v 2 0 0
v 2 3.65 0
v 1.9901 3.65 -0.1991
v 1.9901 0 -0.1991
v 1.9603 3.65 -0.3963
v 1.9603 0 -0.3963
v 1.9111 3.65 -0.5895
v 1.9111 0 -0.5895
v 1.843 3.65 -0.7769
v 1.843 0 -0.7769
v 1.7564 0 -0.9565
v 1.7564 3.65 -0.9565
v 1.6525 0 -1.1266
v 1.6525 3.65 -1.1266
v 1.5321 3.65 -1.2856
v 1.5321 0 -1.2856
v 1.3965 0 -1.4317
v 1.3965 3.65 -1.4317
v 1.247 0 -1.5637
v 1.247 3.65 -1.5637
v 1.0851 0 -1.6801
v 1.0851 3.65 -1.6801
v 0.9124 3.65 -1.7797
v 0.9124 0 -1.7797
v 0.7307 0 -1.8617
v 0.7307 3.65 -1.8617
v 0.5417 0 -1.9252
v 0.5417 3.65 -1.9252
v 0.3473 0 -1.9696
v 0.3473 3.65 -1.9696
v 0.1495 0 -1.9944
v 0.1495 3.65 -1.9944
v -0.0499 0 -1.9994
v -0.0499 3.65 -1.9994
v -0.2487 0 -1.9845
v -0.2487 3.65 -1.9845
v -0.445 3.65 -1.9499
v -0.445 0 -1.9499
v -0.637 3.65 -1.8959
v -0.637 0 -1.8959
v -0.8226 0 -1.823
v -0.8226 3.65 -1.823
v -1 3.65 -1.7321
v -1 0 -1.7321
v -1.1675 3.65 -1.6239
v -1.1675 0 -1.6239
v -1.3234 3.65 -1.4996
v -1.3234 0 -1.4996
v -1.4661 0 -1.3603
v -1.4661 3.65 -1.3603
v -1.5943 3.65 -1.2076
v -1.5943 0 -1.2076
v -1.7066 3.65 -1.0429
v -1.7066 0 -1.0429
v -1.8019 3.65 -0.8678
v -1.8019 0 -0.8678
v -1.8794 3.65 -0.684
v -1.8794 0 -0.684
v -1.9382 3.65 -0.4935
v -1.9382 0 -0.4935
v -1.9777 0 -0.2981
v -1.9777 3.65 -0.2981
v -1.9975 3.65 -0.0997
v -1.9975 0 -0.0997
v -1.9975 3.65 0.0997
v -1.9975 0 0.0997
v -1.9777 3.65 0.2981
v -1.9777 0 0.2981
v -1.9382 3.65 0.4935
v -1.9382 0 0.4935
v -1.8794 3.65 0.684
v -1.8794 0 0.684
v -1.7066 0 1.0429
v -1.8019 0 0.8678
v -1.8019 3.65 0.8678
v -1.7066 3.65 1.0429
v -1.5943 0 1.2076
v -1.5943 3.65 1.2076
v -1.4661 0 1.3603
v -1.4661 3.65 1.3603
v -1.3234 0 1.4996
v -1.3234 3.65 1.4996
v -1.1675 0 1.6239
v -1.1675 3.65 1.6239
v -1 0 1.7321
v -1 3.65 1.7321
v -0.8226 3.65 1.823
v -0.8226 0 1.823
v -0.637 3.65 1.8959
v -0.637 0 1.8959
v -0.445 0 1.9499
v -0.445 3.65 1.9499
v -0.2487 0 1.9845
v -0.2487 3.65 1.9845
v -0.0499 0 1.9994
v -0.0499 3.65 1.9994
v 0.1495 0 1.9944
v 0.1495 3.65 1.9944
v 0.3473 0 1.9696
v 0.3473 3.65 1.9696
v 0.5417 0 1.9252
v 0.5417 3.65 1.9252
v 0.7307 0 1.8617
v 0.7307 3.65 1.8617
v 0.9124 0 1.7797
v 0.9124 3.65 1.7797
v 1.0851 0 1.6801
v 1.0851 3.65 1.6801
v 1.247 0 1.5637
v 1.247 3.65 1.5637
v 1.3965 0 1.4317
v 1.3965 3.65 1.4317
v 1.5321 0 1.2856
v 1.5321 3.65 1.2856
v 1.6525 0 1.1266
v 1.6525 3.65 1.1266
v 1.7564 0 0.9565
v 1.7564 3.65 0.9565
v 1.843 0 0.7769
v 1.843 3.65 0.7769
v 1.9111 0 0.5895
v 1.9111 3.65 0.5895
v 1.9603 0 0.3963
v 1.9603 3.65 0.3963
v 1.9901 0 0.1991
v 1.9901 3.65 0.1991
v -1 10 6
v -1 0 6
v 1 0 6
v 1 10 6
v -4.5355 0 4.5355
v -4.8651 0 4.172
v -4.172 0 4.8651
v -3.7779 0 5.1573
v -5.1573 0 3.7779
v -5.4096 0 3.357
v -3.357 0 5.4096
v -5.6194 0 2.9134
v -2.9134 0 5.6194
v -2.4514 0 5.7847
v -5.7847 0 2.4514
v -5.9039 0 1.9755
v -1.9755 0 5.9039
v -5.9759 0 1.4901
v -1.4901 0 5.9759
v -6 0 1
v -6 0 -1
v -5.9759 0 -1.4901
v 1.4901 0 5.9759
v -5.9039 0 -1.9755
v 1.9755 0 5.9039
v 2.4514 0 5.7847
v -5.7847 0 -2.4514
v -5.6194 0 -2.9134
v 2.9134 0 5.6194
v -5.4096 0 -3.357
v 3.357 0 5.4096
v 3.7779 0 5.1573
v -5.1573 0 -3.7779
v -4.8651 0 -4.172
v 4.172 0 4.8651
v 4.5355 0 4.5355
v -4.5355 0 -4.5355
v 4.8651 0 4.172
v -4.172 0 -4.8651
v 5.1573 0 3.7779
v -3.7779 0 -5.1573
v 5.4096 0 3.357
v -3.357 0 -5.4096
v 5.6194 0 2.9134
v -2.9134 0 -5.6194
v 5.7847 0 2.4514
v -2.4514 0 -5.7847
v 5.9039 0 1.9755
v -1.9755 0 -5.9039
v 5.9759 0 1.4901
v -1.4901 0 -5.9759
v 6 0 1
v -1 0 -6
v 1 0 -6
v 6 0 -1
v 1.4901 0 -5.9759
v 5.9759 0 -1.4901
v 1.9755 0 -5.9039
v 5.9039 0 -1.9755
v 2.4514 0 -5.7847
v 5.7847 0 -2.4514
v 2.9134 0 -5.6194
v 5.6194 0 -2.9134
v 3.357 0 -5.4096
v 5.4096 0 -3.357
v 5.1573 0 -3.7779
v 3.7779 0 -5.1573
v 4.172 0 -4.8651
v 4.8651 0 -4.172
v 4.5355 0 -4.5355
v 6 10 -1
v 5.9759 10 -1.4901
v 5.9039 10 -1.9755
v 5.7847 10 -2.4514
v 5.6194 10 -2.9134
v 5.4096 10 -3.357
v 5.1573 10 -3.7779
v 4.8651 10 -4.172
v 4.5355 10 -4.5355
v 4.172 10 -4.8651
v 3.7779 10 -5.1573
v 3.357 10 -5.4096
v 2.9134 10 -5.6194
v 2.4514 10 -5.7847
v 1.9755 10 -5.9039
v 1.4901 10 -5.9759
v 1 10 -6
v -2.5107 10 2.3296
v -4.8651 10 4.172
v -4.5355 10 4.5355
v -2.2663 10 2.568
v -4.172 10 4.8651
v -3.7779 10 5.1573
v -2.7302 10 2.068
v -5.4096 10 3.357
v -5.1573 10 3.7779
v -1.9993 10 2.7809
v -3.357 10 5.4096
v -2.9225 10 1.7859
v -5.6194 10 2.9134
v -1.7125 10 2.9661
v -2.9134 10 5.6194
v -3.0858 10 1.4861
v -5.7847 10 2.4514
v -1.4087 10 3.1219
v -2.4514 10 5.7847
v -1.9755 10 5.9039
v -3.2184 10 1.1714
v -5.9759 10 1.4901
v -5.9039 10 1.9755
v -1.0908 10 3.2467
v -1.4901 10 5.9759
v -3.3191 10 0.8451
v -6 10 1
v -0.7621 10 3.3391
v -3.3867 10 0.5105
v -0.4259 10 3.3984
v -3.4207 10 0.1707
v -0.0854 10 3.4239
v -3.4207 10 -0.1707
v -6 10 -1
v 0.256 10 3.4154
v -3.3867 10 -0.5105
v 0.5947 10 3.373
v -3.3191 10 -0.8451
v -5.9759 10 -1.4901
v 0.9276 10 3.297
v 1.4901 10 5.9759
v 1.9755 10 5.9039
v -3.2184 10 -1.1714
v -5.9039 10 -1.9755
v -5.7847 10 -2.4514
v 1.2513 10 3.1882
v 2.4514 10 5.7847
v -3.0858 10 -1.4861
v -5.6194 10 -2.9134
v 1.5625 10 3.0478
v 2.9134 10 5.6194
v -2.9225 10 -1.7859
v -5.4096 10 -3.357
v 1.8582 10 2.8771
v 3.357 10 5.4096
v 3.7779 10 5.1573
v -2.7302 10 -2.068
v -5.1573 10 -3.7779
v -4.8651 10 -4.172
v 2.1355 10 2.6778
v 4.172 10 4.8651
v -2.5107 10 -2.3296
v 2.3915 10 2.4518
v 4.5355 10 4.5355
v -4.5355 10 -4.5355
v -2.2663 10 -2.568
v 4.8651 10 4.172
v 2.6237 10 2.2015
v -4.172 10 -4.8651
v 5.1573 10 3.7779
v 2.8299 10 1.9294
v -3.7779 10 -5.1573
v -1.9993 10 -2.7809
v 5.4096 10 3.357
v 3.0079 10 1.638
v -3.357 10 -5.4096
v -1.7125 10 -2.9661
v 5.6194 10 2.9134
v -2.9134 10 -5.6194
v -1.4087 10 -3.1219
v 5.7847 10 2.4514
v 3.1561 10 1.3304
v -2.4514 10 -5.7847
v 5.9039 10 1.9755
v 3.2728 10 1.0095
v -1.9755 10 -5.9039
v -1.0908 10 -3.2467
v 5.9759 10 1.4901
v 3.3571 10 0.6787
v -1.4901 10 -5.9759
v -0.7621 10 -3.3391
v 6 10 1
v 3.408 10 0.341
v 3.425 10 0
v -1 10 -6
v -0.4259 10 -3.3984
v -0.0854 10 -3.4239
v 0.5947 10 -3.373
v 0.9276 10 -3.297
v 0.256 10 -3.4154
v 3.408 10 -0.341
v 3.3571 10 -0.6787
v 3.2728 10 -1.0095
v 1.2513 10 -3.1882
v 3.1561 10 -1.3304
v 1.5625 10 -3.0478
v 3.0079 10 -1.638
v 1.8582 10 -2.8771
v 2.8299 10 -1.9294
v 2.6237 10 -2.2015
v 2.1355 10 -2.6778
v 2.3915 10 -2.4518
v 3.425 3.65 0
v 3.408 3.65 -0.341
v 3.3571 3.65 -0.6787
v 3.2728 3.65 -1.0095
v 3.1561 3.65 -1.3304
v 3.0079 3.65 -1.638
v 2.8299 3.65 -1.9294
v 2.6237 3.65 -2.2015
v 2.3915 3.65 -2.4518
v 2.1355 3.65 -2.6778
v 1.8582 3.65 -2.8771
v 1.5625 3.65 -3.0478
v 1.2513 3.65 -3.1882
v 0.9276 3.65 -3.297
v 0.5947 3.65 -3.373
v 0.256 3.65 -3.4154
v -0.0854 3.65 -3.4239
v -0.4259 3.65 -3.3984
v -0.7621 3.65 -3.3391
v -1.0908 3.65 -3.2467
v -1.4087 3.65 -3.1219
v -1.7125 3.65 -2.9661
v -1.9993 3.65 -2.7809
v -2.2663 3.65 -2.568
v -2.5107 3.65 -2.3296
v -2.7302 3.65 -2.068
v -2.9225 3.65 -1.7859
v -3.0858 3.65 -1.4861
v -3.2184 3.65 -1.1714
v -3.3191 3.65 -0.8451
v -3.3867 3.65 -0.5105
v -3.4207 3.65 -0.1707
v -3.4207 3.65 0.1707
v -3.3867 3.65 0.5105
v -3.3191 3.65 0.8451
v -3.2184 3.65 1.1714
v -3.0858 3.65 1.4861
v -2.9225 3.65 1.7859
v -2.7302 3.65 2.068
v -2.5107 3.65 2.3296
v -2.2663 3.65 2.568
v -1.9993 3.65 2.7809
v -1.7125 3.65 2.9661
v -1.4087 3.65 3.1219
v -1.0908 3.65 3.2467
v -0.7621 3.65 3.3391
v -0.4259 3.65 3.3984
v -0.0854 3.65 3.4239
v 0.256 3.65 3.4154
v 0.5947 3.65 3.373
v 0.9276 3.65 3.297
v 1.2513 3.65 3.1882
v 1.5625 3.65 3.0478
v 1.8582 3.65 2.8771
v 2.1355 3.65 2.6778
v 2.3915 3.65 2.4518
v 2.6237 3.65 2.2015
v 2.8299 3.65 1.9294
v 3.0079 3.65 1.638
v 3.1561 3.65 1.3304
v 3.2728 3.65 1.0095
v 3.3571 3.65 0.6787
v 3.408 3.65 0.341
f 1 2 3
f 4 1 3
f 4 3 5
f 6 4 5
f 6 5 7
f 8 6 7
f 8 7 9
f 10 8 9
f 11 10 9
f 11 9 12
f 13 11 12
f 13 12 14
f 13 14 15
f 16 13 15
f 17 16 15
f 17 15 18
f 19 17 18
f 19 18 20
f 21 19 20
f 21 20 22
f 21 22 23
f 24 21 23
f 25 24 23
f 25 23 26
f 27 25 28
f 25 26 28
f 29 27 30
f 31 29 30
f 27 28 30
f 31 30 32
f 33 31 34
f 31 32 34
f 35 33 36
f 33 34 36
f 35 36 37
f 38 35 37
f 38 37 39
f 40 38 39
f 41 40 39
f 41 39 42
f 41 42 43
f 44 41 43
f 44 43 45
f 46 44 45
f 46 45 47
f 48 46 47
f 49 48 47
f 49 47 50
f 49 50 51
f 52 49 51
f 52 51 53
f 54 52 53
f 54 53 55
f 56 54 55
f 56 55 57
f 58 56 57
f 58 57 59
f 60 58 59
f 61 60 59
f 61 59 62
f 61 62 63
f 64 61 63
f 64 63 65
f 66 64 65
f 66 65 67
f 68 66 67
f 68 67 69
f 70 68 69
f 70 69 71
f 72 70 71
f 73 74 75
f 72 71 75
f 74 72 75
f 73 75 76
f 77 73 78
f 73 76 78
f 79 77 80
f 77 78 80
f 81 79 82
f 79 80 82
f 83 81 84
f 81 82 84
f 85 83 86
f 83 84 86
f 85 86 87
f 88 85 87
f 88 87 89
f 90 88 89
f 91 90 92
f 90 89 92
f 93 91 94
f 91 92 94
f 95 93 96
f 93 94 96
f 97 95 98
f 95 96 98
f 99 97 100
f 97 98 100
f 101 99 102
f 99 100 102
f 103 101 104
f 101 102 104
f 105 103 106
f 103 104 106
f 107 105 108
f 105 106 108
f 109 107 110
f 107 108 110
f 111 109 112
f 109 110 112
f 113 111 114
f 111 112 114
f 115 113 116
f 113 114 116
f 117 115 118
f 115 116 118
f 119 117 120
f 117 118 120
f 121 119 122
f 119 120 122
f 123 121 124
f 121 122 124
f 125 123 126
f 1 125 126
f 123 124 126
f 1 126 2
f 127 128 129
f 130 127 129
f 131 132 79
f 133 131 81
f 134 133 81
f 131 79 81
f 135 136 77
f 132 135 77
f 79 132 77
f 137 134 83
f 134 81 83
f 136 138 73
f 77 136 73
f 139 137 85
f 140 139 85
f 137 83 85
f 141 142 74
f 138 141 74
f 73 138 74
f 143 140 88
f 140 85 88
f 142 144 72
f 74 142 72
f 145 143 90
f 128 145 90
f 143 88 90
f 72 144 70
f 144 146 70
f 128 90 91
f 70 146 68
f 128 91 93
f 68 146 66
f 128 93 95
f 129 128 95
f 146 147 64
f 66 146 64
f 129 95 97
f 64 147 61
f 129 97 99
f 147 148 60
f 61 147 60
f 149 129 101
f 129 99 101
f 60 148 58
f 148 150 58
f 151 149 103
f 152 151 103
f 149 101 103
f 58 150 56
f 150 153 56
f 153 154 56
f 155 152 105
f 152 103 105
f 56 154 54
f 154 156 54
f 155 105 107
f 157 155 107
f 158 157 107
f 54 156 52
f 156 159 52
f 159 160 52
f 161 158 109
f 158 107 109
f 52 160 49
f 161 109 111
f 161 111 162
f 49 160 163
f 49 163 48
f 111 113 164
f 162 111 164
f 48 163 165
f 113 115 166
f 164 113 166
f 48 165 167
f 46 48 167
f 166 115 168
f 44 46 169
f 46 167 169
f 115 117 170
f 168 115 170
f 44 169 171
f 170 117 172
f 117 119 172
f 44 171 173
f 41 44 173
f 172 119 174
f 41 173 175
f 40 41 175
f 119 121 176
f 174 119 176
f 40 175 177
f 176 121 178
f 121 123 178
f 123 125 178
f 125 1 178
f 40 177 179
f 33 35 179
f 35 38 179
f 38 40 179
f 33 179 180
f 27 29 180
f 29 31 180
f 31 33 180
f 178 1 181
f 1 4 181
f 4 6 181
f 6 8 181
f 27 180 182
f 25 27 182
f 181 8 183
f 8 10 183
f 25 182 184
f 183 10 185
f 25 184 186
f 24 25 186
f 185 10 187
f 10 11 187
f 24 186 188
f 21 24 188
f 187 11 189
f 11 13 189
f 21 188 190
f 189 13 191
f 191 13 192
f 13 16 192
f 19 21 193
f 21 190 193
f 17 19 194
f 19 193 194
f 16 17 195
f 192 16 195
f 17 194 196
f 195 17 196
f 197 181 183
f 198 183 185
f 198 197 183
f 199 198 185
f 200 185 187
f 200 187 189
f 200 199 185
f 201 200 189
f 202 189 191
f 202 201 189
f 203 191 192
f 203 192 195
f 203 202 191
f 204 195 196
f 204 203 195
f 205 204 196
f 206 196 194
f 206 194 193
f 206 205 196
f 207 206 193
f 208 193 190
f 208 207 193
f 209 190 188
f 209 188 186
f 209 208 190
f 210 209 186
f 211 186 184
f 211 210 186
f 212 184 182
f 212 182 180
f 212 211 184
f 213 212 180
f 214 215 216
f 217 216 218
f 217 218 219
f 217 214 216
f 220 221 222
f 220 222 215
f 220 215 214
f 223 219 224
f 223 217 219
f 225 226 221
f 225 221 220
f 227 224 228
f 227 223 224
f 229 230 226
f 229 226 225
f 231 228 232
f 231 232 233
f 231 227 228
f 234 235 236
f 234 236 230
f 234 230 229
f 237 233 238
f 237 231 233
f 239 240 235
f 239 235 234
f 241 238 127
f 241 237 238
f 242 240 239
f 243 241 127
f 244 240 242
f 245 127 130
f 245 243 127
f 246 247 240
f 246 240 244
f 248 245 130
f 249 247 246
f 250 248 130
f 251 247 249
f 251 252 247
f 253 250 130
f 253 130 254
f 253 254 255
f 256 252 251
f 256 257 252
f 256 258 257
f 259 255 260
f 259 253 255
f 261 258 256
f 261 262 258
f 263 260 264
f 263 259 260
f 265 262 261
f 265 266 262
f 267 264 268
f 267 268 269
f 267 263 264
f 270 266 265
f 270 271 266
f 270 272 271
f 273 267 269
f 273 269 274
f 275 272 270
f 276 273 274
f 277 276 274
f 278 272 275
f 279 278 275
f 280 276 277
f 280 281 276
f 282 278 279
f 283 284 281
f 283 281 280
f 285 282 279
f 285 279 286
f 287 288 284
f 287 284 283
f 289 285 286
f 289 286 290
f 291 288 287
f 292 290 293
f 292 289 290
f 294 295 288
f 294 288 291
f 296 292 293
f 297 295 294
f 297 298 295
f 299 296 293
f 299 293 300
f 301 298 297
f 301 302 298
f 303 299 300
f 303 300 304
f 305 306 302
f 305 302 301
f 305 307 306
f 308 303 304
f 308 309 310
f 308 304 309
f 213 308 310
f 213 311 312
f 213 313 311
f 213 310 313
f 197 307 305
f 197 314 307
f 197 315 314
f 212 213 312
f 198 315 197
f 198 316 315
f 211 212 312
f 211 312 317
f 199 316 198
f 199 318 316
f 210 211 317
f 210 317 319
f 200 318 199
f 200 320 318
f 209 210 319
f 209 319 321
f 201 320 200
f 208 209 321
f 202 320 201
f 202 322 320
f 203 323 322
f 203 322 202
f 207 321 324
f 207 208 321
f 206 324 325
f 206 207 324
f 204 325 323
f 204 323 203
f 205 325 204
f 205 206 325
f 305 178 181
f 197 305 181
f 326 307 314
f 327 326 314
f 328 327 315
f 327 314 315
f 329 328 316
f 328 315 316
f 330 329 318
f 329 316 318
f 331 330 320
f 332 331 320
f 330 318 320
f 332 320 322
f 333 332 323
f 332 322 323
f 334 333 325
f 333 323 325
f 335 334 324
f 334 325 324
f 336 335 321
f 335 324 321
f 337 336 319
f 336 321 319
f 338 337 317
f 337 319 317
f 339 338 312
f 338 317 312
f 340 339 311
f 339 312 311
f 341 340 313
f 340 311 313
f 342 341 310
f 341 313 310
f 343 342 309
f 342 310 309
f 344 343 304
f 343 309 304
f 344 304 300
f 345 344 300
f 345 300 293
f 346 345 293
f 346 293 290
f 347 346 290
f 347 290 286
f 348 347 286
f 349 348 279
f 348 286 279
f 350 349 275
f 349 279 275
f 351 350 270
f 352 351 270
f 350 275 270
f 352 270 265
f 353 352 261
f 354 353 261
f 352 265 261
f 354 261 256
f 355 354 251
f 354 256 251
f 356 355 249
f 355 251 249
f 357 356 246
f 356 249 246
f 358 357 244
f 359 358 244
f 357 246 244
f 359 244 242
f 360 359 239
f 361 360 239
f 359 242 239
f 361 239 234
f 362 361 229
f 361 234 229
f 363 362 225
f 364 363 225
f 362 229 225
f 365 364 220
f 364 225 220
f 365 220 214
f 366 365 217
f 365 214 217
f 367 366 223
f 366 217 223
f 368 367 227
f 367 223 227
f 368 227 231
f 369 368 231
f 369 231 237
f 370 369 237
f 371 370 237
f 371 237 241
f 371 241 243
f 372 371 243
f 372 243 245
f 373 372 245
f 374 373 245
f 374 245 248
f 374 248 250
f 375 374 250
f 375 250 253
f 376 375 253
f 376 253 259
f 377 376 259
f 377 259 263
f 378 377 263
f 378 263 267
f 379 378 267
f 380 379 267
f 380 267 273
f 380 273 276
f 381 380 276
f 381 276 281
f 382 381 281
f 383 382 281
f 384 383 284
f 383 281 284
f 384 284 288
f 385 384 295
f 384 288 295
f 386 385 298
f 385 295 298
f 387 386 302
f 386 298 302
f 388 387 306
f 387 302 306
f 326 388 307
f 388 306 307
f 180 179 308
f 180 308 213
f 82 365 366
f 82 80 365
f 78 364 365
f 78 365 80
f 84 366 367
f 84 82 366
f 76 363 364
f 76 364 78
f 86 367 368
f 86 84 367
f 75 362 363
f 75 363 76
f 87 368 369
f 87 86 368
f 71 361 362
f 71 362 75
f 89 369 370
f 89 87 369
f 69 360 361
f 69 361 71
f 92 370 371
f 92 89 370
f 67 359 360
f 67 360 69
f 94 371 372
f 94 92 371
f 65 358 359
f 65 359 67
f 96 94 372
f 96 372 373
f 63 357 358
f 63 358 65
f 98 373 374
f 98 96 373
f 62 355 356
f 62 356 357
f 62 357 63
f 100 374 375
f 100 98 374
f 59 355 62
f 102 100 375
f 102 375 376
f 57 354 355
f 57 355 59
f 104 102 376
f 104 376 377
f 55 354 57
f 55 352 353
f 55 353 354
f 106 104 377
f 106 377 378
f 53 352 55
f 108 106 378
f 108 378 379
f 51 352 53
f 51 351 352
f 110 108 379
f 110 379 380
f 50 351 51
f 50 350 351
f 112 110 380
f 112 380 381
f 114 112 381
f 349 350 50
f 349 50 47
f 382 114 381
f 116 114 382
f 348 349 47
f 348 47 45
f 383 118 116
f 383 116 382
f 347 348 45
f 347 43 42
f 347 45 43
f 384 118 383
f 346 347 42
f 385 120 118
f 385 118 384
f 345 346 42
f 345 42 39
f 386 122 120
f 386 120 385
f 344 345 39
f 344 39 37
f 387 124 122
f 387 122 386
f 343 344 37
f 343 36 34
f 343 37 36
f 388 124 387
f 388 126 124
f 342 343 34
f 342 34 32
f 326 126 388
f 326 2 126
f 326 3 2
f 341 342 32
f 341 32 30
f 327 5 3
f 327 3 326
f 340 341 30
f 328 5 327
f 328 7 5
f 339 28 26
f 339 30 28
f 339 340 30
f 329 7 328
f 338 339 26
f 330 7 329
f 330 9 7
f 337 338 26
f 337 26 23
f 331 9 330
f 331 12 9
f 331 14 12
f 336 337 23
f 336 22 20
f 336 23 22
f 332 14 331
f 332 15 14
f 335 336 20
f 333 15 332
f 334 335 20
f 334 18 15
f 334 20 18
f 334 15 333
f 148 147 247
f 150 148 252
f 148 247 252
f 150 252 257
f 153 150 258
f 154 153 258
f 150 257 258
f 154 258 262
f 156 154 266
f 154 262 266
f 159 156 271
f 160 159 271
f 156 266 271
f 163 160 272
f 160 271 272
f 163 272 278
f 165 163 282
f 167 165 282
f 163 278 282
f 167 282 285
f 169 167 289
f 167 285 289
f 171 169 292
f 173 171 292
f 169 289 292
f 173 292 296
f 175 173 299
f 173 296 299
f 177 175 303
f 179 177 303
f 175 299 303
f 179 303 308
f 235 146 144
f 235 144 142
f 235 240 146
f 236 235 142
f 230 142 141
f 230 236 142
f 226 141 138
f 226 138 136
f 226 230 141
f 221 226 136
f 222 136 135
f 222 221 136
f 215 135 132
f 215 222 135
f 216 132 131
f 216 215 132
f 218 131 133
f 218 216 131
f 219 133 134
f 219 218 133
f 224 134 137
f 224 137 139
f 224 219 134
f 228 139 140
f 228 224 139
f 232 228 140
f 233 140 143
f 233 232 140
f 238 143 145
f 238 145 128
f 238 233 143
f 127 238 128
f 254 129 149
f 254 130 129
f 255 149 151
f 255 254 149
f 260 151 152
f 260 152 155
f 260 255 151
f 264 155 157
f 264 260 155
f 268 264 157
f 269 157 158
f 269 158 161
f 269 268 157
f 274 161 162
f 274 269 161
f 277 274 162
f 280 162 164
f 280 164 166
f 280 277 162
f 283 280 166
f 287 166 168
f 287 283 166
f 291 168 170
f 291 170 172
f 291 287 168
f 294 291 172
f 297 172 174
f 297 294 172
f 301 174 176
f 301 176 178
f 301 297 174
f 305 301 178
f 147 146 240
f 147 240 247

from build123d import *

# Parameters (mm, degrees)
SKETCH1_W           = 12
SKETCH1_H           = 12
BOSS_EXTRUDE1_DEPTH = 10
FILLET1_R           = 5
SKETCH2_R           = 2
CUT_EXTRUDE1_DEPTH  = 11
SKETCH3_R           = 3.425
CUT_EXTRUDE2_DEPTH  = 6.35


with BuildPart() as part:
    # Sketch1 → Boss-Extrude1 (new body)
    with BuildSketch(Plane(origin=(0, 0, 0), x_dir=(1, 0, 0), z_dir=(0, 1, 0))):
        Rectangle(SKETCH1_W, SKETCH1_H)
    extrude(amount=BOSS_EXTRUDE1_DEPTH)

    # Fillet1
    fillet1_edges = [part.edges().sort_by_distance(p)[0] for p in [
        (-6, 5, -6),
        (6, 5, -6),
        (6, 5, 6),
        (-6, 5, 6),
    ]]
    fillet(fillet1_edges, radius=FILLET1_R)

    # Sketch2 → Cut-Extrude1 (cut, through all)
    with BuildSketch(Plane(origin=(0, 10, 0), x_dir=(1, 0, 0), z_dir=(0, 1, 0))):
        Circle(SKETCH2_R)
    extrude(amount=-CUT_EXTRUDE1_DEPTH, mode=Mode.SUBTRACT)

    # Sketch3 → Cut-Extrude2 (cut)
    with BuildSketch(Plane(origin=(0, 10, 0), x_dir=(1, 0, 0), z_dir=(0, 1, 0))):
        Circle(SKETCH3_R)
    extrude(amount=-CUT_EXTRUDE2_DEPTH, mode=Mode.SUBTRACT)


solid = part.part
